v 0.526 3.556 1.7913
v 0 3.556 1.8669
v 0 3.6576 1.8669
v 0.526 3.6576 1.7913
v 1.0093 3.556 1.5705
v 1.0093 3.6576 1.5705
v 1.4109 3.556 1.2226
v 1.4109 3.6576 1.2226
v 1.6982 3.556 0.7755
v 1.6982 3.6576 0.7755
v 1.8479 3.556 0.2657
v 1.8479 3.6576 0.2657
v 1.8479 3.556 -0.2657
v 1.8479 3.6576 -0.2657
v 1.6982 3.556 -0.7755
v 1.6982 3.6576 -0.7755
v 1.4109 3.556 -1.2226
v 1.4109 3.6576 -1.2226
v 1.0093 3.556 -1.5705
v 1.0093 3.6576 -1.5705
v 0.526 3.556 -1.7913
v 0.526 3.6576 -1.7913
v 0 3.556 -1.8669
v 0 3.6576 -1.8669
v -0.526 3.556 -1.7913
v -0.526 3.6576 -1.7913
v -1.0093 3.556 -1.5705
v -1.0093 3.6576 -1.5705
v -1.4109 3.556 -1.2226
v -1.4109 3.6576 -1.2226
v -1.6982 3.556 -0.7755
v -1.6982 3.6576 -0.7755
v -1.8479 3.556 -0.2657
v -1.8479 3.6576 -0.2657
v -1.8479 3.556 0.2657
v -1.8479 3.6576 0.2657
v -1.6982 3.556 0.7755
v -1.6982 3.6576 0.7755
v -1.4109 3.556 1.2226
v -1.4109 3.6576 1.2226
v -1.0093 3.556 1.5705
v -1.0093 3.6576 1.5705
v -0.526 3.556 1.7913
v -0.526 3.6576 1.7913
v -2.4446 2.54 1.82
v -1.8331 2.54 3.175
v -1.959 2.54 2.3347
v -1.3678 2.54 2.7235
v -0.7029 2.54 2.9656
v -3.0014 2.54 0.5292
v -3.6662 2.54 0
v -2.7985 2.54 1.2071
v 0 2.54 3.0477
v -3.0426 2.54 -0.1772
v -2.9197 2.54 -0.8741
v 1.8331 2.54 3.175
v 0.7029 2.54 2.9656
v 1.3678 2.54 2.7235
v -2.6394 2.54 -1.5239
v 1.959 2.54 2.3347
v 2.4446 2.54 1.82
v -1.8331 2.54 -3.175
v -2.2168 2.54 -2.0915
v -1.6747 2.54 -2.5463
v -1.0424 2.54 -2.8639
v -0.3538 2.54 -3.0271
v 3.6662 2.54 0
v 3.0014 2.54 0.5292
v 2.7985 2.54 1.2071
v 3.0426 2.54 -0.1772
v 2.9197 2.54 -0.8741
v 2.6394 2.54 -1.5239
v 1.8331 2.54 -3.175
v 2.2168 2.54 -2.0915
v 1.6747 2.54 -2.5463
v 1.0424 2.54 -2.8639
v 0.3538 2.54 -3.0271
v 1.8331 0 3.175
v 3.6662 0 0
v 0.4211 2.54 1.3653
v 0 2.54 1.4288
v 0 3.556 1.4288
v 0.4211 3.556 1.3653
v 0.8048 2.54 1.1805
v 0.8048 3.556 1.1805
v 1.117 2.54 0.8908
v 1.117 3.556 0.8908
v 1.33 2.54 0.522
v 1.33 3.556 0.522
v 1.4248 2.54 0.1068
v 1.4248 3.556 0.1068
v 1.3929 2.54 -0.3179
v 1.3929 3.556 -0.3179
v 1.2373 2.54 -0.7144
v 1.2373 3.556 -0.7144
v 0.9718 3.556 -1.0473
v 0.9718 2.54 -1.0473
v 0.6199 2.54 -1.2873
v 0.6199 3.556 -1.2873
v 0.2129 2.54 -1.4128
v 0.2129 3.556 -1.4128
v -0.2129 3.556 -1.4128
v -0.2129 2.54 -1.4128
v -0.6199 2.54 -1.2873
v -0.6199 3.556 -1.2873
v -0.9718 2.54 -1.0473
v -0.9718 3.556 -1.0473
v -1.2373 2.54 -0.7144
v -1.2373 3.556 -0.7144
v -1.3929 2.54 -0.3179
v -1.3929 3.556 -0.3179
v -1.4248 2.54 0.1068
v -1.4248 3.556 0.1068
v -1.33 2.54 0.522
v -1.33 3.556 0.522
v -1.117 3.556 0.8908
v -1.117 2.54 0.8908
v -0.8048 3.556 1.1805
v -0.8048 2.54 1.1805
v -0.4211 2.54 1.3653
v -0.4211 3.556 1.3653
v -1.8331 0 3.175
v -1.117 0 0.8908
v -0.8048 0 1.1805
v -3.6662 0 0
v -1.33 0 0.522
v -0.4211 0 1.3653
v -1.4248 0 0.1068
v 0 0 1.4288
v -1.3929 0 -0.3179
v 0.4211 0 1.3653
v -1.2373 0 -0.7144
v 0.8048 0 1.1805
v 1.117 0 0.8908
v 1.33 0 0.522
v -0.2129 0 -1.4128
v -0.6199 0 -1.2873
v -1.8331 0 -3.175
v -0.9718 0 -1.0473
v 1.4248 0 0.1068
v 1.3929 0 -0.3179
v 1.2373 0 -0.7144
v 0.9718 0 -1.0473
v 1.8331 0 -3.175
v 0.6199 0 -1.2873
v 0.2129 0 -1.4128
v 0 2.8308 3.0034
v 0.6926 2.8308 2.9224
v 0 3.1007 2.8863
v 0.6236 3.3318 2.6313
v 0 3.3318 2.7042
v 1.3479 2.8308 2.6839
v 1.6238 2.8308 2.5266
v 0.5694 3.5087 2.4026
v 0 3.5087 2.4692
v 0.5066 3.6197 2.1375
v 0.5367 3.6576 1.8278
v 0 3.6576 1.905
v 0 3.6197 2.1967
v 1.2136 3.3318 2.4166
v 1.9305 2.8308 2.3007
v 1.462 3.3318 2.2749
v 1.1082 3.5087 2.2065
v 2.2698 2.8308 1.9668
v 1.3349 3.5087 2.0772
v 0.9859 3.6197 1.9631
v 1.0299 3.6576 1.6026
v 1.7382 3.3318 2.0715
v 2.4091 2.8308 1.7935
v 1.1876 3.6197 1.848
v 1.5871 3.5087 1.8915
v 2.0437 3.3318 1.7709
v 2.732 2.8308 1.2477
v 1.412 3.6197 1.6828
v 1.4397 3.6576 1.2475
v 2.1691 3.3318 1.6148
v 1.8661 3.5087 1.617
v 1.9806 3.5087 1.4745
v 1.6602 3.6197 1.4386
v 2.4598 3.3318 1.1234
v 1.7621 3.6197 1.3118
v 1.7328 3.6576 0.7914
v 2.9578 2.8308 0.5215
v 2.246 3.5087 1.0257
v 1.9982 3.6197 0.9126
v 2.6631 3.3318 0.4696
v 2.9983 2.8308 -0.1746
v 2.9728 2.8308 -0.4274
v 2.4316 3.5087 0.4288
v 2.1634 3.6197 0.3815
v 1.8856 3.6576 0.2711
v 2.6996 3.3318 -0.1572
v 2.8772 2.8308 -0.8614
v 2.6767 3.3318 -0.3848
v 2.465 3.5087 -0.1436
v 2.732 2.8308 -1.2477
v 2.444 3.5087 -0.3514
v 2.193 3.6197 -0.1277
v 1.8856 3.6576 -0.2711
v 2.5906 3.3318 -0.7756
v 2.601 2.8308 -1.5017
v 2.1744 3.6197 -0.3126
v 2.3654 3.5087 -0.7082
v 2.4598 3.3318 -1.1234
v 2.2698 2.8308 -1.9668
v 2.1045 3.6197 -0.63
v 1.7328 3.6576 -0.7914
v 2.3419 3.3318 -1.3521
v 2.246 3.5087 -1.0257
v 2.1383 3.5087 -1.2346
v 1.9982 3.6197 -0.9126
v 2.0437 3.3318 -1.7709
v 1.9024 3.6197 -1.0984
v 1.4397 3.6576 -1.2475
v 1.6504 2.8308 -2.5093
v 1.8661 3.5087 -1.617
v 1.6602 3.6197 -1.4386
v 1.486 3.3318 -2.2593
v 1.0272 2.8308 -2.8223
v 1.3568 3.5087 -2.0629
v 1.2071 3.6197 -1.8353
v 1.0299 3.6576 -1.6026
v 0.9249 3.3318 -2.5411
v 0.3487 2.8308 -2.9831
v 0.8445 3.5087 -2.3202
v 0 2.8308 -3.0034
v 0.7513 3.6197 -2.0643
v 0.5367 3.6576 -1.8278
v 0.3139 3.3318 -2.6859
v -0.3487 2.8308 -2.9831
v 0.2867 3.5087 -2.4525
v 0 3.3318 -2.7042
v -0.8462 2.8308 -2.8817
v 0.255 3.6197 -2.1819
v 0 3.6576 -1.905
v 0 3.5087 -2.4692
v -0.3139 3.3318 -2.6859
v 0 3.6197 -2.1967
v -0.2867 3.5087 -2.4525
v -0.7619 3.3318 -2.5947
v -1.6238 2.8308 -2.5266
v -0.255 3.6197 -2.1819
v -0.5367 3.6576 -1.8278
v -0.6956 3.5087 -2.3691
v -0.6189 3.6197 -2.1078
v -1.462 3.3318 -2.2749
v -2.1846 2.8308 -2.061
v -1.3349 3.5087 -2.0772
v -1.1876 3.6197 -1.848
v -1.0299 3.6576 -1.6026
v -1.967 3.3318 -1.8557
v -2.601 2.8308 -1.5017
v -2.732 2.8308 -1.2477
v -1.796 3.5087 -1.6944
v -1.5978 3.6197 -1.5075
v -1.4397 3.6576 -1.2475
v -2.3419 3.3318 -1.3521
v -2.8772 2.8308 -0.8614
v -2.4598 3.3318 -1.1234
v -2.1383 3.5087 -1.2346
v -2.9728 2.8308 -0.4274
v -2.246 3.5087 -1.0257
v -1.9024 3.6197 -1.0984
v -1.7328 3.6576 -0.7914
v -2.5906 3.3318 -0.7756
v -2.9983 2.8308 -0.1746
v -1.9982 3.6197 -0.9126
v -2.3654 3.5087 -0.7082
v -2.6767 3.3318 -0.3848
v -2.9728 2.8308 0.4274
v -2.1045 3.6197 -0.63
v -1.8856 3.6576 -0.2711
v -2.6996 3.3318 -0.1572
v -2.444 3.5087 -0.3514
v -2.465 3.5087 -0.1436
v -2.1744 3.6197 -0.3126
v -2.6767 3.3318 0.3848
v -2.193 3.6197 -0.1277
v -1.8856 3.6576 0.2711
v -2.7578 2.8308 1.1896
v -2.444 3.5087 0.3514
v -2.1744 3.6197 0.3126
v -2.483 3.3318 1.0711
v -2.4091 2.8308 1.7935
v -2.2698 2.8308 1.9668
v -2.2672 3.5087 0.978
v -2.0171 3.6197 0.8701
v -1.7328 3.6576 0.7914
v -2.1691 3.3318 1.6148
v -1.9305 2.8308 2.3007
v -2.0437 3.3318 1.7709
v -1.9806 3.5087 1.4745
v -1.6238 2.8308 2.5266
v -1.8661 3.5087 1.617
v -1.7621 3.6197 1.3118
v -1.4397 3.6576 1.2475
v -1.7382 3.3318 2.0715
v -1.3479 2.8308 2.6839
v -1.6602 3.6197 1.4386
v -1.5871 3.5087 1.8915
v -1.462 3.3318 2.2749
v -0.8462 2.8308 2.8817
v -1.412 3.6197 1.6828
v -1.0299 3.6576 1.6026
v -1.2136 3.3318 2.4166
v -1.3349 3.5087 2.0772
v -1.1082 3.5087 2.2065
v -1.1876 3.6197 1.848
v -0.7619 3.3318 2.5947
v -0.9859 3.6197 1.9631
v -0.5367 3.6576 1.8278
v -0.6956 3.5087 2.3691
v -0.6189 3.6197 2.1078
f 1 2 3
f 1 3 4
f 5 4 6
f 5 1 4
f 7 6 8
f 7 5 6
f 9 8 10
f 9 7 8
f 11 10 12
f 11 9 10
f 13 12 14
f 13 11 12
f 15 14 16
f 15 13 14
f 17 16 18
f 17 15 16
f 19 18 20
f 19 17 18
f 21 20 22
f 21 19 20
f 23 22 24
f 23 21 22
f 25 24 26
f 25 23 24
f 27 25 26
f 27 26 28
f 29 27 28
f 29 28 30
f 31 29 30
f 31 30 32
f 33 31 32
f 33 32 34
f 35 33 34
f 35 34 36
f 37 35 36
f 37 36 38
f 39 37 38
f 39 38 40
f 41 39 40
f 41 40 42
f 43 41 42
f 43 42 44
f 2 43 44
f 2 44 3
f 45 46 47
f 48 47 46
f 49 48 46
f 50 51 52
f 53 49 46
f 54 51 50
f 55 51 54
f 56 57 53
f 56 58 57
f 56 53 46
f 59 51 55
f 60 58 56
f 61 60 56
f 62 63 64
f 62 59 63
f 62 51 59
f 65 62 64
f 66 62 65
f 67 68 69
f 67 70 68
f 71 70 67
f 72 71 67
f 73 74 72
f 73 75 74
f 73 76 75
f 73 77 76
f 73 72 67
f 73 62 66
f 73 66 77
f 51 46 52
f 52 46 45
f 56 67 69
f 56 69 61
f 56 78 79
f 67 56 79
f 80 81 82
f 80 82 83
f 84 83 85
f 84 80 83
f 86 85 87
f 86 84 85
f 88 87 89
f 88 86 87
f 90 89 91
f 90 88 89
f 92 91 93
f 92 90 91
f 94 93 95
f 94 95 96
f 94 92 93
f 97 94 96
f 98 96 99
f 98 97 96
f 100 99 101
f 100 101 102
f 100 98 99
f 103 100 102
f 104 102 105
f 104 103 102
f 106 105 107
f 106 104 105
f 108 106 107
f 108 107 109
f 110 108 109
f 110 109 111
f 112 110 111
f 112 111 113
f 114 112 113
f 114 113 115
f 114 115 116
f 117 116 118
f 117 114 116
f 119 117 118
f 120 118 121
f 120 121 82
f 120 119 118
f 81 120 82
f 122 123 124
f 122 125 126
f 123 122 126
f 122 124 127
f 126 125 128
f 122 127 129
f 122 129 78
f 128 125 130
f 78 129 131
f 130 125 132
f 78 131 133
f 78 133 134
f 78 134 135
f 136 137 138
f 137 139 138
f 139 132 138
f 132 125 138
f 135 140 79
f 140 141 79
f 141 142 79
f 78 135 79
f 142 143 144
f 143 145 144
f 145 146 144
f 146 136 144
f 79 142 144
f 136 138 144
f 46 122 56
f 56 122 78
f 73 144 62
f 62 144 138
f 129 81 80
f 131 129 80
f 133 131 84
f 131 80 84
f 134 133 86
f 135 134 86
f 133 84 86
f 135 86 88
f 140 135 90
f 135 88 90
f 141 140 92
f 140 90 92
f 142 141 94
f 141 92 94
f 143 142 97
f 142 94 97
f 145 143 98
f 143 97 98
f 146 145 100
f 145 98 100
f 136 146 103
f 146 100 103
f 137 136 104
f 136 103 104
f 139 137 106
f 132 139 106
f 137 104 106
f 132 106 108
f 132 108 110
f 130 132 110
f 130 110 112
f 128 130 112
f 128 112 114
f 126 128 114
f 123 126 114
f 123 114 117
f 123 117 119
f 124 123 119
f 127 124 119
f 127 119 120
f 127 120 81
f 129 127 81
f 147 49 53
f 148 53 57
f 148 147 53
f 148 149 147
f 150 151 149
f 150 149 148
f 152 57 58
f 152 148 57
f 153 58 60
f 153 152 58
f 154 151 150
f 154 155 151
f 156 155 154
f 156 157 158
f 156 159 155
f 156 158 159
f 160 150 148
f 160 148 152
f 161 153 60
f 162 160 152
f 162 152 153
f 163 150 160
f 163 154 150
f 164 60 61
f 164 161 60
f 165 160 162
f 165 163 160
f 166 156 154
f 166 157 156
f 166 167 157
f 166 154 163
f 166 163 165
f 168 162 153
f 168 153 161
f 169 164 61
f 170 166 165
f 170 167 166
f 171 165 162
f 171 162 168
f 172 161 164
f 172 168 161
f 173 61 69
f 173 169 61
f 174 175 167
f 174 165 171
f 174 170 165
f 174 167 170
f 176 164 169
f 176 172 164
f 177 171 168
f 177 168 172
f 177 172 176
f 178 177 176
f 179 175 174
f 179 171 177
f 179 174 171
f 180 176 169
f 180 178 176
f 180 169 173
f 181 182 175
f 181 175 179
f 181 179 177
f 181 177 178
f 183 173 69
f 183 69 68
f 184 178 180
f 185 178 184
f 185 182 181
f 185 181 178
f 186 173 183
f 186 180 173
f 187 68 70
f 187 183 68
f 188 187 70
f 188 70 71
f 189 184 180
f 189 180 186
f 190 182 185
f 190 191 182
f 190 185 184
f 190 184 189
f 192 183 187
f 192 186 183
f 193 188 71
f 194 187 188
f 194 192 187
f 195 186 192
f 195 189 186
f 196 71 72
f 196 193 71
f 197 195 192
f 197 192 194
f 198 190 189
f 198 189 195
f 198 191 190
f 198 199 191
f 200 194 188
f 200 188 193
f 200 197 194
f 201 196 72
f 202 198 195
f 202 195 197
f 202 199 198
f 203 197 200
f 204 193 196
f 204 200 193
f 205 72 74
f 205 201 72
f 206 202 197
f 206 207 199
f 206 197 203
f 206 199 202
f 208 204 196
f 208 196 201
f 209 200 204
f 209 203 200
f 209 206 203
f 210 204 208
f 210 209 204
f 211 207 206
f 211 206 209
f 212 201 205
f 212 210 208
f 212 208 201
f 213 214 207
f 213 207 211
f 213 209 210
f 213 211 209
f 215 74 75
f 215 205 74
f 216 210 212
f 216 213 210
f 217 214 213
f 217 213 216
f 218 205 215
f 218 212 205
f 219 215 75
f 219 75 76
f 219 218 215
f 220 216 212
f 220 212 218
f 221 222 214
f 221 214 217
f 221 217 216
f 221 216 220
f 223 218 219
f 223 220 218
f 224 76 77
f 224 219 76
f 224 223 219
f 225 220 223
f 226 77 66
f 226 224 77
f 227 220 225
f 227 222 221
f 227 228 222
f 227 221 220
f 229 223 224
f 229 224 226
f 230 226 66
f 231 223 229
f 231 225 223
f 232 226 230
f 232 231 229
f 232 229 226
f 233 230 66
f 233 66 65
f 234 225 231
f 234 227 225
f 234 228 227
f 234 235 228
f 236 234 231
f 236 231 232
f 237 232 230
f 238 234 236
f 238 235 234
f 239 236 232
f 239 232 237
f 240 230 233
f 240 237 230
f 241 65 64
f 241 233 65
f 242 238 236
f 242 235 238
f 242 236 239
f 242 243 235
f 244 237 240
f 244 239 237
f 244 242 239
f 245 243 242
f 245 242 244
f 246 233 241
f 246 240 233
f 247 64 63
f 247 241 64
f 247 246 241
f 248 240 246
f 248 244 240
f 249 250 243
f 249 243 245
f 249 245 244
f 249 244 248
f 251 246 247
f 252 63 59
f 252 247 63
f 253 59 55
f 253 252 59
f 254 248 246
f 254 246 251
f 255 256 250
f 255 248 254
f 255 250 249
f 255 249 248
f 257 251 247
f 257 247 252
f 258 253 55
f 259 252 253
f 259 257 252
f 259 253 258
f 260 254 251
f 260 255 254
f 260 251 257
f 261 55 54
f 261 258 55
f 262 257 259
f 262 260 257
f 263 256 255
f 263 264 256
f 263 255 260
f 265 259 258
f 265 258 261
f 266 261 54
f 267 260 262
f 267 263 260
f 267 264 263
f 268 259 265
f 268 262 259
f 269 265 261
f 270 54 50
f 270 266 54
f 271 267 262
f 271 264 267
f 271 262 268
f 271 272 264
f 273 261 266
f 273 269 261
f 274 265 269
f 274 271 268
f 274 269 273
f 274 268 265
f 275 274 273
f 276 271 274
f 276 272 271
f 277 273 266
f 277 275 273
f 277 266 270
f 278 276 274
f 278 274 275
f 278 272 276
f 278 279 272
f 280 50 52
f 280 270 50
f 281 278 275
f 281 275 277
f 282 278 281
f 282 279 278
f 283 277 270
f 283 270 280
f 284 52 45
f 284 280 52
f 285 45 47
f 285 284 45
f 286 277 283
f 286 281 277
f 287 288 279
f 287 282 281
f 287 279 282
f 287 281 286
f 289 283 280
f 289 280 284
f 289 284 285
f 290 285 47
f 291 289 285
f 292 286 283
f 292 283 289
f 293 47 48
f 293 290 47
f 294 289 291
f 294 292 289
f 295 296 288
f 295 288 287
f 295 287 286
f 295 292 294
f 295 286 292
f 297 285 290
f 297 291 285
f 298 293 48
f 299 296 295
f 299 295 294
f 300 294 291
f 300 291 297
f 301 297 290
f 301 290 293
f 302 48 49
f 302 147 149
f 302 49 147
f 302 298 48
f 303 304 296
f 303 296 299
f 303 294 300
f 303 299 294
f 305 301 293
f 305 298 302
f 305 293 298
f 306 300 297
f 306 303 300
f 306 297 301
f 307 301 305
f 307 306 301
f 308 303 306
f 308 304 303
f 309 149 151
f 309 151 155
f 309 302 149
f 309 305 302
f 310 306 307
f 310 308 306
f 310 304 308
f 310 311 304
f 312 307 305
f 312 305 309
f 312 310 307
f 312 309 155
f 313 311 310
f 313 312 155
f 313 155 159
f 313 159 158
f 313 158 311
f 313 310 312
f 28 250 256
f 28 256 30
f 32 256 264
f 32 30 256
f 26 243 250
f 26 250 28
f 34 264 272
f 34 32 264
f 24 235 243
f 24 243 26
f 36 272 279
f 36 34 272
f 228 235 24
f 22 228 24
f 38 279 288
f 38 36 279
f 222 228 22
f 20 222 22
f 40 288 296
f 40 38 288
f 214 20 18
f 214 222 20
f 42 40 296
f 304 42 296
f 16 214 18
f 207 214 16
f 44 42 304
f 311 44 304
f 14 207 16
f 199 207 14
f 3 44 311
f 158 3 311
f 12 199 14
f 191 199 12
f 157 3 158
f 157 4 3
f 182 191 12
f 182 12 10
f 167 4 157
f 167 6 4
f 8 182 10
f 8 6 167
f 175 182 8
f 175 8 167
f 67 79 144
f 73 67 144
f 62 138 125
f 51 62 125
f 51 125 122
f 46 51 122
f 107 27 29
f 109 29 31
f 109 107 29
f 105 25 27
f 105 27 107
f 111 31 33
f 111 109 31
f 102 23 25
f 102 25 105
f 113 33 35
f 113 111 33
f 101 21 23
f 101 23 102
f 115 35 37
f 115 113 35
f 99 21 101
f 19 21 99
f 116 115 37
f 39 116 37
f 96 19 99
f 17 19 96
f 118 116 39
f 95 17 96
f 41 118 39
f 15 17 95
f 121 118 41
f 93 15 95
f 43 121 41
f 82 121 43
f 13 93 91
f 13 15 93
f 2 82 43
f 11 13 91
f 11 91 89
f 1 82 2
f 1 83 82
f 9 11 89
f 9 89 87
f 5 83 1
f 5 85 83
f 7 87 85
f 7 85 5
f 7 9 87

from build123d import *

# Parameters (mm, degrees)
BOSS_EXTRUDE1_DEPTH = 2.54
SKETCH2_R           = 3.048
SKETCH2_R_2         = 1.8669
BOSS_EXTRUDE2_DEPTH = 1.1176
FILLET1_R           = 1.143
SKETCH3_R           = 1.8669
SKETCH3_R_2         = 1.42875
BOSS_EXTRUDE3_DEPTH = 1.016
SKETCH4_R           = 1.42875
CUT_EXTRUDE1_DEPTH  = 6.474765596


with BuildPart() as part:
    # Sketch1 → Boss-Extrude1 (new body)
    with BuildSketch(Plane(origin=(0, 0, 0), x_dir=(1, 0, 0), z_dir=(0, 1, 0))):
        Polygon((3.666174209, 0), (1.833087105, 3.175), (-1.833087105, 3.175), (-3.666174209, 0), (-1.833087105, -3.175), (1.833087105, -3.175), align=None)
    extrude(amount=BOSS_EXTRUDE1_DEPTH)

    # Sketch2 → Boss-Extrude2 (add)
    with BuildSketch(Plane(origin=(0, 2.54, 0), x_dir=(1, 0, 0), z_dir=(0, 1, 0))):
        with Locations(Location((0, 0, 0), (0, 0, 270))):
            Circle(SKETCH2_R)
        with Locations(Location((0, 0, 0), (0, 0, 270))):
            Circle(SKETCH2_R_2, mode=Mode.SUBTRACT)
    extrude(amount=BOSS_EXTRUDE2_DEPTH)

    # Fillet1
    # the kernel refuses this fillet: 1.143 mm, written as the material it takes off along each edge
    with BuildSketch(Plane(origin=(0, 3.6576, 0), x_dir=(0, 0, 1), z_dir=(-1, 0, 0))) as fillet1_piece_1_section:
        with BuildLine():
            CenterArc((3.048 - FILLET1_R, -FILLET1_R), FILLET1_R, 0, 90)
            Line((3.048 - FILLET1_R, 0), (3.048, 0))
            Line((3.048, 0), (3.048, -FILLET1_R))
        make_face()
    fillet1_piece_1 = revolve(axis=Axis((0, 3.6576, 0), (0, 1, 0)), mode=Mode.PRIVATE)
    fillet1_piece_1 = split(fillet1_piece_1, bisect_by=Plane(origin=(0, 2.54, -2.716774649), z_dir=(0, 1, 0)), keep=Keep.TOP, mode=Mode.PRIVATE)
    add(fillet1_piece_1, mode=Mode.SUBTRACT)

    # Sketch3 → Boss-Extrude3 (add)
    with BuildSketch(Plane(origin=(0, 2.54, 0), x_dir=(1, 0, 0), z_dir=(0, 1, 0))):
        with Locations(Location((0, 0, 0), (0, 0, 270))):
            Circle(SKETCH3_R)
        with Locations(Location((0, 0, 0), (0, 0, 270))):
            Circle(SKETCH3_R_2, mode=Mode.SUBTRACT)
    extrude(amount=BOSS_EXTRUDE3_DEPTH)

    # Sketch4 → Cut-Extrude1 (cut, through all)
    with BuildSketch(Plane(origin=(0, 2.54, 0), x_dir=(1, 0, 0), z_dir=(0, 1, 0))):
        with Locations(Location((0, 0, 0), (0, 0, 270))):
            Circle(SKETCH4_R)
    extrude(amount=-CUT_EXTRUDE1_DEPTH, mode=Mode.SUBTRACT)


solid = part.part
